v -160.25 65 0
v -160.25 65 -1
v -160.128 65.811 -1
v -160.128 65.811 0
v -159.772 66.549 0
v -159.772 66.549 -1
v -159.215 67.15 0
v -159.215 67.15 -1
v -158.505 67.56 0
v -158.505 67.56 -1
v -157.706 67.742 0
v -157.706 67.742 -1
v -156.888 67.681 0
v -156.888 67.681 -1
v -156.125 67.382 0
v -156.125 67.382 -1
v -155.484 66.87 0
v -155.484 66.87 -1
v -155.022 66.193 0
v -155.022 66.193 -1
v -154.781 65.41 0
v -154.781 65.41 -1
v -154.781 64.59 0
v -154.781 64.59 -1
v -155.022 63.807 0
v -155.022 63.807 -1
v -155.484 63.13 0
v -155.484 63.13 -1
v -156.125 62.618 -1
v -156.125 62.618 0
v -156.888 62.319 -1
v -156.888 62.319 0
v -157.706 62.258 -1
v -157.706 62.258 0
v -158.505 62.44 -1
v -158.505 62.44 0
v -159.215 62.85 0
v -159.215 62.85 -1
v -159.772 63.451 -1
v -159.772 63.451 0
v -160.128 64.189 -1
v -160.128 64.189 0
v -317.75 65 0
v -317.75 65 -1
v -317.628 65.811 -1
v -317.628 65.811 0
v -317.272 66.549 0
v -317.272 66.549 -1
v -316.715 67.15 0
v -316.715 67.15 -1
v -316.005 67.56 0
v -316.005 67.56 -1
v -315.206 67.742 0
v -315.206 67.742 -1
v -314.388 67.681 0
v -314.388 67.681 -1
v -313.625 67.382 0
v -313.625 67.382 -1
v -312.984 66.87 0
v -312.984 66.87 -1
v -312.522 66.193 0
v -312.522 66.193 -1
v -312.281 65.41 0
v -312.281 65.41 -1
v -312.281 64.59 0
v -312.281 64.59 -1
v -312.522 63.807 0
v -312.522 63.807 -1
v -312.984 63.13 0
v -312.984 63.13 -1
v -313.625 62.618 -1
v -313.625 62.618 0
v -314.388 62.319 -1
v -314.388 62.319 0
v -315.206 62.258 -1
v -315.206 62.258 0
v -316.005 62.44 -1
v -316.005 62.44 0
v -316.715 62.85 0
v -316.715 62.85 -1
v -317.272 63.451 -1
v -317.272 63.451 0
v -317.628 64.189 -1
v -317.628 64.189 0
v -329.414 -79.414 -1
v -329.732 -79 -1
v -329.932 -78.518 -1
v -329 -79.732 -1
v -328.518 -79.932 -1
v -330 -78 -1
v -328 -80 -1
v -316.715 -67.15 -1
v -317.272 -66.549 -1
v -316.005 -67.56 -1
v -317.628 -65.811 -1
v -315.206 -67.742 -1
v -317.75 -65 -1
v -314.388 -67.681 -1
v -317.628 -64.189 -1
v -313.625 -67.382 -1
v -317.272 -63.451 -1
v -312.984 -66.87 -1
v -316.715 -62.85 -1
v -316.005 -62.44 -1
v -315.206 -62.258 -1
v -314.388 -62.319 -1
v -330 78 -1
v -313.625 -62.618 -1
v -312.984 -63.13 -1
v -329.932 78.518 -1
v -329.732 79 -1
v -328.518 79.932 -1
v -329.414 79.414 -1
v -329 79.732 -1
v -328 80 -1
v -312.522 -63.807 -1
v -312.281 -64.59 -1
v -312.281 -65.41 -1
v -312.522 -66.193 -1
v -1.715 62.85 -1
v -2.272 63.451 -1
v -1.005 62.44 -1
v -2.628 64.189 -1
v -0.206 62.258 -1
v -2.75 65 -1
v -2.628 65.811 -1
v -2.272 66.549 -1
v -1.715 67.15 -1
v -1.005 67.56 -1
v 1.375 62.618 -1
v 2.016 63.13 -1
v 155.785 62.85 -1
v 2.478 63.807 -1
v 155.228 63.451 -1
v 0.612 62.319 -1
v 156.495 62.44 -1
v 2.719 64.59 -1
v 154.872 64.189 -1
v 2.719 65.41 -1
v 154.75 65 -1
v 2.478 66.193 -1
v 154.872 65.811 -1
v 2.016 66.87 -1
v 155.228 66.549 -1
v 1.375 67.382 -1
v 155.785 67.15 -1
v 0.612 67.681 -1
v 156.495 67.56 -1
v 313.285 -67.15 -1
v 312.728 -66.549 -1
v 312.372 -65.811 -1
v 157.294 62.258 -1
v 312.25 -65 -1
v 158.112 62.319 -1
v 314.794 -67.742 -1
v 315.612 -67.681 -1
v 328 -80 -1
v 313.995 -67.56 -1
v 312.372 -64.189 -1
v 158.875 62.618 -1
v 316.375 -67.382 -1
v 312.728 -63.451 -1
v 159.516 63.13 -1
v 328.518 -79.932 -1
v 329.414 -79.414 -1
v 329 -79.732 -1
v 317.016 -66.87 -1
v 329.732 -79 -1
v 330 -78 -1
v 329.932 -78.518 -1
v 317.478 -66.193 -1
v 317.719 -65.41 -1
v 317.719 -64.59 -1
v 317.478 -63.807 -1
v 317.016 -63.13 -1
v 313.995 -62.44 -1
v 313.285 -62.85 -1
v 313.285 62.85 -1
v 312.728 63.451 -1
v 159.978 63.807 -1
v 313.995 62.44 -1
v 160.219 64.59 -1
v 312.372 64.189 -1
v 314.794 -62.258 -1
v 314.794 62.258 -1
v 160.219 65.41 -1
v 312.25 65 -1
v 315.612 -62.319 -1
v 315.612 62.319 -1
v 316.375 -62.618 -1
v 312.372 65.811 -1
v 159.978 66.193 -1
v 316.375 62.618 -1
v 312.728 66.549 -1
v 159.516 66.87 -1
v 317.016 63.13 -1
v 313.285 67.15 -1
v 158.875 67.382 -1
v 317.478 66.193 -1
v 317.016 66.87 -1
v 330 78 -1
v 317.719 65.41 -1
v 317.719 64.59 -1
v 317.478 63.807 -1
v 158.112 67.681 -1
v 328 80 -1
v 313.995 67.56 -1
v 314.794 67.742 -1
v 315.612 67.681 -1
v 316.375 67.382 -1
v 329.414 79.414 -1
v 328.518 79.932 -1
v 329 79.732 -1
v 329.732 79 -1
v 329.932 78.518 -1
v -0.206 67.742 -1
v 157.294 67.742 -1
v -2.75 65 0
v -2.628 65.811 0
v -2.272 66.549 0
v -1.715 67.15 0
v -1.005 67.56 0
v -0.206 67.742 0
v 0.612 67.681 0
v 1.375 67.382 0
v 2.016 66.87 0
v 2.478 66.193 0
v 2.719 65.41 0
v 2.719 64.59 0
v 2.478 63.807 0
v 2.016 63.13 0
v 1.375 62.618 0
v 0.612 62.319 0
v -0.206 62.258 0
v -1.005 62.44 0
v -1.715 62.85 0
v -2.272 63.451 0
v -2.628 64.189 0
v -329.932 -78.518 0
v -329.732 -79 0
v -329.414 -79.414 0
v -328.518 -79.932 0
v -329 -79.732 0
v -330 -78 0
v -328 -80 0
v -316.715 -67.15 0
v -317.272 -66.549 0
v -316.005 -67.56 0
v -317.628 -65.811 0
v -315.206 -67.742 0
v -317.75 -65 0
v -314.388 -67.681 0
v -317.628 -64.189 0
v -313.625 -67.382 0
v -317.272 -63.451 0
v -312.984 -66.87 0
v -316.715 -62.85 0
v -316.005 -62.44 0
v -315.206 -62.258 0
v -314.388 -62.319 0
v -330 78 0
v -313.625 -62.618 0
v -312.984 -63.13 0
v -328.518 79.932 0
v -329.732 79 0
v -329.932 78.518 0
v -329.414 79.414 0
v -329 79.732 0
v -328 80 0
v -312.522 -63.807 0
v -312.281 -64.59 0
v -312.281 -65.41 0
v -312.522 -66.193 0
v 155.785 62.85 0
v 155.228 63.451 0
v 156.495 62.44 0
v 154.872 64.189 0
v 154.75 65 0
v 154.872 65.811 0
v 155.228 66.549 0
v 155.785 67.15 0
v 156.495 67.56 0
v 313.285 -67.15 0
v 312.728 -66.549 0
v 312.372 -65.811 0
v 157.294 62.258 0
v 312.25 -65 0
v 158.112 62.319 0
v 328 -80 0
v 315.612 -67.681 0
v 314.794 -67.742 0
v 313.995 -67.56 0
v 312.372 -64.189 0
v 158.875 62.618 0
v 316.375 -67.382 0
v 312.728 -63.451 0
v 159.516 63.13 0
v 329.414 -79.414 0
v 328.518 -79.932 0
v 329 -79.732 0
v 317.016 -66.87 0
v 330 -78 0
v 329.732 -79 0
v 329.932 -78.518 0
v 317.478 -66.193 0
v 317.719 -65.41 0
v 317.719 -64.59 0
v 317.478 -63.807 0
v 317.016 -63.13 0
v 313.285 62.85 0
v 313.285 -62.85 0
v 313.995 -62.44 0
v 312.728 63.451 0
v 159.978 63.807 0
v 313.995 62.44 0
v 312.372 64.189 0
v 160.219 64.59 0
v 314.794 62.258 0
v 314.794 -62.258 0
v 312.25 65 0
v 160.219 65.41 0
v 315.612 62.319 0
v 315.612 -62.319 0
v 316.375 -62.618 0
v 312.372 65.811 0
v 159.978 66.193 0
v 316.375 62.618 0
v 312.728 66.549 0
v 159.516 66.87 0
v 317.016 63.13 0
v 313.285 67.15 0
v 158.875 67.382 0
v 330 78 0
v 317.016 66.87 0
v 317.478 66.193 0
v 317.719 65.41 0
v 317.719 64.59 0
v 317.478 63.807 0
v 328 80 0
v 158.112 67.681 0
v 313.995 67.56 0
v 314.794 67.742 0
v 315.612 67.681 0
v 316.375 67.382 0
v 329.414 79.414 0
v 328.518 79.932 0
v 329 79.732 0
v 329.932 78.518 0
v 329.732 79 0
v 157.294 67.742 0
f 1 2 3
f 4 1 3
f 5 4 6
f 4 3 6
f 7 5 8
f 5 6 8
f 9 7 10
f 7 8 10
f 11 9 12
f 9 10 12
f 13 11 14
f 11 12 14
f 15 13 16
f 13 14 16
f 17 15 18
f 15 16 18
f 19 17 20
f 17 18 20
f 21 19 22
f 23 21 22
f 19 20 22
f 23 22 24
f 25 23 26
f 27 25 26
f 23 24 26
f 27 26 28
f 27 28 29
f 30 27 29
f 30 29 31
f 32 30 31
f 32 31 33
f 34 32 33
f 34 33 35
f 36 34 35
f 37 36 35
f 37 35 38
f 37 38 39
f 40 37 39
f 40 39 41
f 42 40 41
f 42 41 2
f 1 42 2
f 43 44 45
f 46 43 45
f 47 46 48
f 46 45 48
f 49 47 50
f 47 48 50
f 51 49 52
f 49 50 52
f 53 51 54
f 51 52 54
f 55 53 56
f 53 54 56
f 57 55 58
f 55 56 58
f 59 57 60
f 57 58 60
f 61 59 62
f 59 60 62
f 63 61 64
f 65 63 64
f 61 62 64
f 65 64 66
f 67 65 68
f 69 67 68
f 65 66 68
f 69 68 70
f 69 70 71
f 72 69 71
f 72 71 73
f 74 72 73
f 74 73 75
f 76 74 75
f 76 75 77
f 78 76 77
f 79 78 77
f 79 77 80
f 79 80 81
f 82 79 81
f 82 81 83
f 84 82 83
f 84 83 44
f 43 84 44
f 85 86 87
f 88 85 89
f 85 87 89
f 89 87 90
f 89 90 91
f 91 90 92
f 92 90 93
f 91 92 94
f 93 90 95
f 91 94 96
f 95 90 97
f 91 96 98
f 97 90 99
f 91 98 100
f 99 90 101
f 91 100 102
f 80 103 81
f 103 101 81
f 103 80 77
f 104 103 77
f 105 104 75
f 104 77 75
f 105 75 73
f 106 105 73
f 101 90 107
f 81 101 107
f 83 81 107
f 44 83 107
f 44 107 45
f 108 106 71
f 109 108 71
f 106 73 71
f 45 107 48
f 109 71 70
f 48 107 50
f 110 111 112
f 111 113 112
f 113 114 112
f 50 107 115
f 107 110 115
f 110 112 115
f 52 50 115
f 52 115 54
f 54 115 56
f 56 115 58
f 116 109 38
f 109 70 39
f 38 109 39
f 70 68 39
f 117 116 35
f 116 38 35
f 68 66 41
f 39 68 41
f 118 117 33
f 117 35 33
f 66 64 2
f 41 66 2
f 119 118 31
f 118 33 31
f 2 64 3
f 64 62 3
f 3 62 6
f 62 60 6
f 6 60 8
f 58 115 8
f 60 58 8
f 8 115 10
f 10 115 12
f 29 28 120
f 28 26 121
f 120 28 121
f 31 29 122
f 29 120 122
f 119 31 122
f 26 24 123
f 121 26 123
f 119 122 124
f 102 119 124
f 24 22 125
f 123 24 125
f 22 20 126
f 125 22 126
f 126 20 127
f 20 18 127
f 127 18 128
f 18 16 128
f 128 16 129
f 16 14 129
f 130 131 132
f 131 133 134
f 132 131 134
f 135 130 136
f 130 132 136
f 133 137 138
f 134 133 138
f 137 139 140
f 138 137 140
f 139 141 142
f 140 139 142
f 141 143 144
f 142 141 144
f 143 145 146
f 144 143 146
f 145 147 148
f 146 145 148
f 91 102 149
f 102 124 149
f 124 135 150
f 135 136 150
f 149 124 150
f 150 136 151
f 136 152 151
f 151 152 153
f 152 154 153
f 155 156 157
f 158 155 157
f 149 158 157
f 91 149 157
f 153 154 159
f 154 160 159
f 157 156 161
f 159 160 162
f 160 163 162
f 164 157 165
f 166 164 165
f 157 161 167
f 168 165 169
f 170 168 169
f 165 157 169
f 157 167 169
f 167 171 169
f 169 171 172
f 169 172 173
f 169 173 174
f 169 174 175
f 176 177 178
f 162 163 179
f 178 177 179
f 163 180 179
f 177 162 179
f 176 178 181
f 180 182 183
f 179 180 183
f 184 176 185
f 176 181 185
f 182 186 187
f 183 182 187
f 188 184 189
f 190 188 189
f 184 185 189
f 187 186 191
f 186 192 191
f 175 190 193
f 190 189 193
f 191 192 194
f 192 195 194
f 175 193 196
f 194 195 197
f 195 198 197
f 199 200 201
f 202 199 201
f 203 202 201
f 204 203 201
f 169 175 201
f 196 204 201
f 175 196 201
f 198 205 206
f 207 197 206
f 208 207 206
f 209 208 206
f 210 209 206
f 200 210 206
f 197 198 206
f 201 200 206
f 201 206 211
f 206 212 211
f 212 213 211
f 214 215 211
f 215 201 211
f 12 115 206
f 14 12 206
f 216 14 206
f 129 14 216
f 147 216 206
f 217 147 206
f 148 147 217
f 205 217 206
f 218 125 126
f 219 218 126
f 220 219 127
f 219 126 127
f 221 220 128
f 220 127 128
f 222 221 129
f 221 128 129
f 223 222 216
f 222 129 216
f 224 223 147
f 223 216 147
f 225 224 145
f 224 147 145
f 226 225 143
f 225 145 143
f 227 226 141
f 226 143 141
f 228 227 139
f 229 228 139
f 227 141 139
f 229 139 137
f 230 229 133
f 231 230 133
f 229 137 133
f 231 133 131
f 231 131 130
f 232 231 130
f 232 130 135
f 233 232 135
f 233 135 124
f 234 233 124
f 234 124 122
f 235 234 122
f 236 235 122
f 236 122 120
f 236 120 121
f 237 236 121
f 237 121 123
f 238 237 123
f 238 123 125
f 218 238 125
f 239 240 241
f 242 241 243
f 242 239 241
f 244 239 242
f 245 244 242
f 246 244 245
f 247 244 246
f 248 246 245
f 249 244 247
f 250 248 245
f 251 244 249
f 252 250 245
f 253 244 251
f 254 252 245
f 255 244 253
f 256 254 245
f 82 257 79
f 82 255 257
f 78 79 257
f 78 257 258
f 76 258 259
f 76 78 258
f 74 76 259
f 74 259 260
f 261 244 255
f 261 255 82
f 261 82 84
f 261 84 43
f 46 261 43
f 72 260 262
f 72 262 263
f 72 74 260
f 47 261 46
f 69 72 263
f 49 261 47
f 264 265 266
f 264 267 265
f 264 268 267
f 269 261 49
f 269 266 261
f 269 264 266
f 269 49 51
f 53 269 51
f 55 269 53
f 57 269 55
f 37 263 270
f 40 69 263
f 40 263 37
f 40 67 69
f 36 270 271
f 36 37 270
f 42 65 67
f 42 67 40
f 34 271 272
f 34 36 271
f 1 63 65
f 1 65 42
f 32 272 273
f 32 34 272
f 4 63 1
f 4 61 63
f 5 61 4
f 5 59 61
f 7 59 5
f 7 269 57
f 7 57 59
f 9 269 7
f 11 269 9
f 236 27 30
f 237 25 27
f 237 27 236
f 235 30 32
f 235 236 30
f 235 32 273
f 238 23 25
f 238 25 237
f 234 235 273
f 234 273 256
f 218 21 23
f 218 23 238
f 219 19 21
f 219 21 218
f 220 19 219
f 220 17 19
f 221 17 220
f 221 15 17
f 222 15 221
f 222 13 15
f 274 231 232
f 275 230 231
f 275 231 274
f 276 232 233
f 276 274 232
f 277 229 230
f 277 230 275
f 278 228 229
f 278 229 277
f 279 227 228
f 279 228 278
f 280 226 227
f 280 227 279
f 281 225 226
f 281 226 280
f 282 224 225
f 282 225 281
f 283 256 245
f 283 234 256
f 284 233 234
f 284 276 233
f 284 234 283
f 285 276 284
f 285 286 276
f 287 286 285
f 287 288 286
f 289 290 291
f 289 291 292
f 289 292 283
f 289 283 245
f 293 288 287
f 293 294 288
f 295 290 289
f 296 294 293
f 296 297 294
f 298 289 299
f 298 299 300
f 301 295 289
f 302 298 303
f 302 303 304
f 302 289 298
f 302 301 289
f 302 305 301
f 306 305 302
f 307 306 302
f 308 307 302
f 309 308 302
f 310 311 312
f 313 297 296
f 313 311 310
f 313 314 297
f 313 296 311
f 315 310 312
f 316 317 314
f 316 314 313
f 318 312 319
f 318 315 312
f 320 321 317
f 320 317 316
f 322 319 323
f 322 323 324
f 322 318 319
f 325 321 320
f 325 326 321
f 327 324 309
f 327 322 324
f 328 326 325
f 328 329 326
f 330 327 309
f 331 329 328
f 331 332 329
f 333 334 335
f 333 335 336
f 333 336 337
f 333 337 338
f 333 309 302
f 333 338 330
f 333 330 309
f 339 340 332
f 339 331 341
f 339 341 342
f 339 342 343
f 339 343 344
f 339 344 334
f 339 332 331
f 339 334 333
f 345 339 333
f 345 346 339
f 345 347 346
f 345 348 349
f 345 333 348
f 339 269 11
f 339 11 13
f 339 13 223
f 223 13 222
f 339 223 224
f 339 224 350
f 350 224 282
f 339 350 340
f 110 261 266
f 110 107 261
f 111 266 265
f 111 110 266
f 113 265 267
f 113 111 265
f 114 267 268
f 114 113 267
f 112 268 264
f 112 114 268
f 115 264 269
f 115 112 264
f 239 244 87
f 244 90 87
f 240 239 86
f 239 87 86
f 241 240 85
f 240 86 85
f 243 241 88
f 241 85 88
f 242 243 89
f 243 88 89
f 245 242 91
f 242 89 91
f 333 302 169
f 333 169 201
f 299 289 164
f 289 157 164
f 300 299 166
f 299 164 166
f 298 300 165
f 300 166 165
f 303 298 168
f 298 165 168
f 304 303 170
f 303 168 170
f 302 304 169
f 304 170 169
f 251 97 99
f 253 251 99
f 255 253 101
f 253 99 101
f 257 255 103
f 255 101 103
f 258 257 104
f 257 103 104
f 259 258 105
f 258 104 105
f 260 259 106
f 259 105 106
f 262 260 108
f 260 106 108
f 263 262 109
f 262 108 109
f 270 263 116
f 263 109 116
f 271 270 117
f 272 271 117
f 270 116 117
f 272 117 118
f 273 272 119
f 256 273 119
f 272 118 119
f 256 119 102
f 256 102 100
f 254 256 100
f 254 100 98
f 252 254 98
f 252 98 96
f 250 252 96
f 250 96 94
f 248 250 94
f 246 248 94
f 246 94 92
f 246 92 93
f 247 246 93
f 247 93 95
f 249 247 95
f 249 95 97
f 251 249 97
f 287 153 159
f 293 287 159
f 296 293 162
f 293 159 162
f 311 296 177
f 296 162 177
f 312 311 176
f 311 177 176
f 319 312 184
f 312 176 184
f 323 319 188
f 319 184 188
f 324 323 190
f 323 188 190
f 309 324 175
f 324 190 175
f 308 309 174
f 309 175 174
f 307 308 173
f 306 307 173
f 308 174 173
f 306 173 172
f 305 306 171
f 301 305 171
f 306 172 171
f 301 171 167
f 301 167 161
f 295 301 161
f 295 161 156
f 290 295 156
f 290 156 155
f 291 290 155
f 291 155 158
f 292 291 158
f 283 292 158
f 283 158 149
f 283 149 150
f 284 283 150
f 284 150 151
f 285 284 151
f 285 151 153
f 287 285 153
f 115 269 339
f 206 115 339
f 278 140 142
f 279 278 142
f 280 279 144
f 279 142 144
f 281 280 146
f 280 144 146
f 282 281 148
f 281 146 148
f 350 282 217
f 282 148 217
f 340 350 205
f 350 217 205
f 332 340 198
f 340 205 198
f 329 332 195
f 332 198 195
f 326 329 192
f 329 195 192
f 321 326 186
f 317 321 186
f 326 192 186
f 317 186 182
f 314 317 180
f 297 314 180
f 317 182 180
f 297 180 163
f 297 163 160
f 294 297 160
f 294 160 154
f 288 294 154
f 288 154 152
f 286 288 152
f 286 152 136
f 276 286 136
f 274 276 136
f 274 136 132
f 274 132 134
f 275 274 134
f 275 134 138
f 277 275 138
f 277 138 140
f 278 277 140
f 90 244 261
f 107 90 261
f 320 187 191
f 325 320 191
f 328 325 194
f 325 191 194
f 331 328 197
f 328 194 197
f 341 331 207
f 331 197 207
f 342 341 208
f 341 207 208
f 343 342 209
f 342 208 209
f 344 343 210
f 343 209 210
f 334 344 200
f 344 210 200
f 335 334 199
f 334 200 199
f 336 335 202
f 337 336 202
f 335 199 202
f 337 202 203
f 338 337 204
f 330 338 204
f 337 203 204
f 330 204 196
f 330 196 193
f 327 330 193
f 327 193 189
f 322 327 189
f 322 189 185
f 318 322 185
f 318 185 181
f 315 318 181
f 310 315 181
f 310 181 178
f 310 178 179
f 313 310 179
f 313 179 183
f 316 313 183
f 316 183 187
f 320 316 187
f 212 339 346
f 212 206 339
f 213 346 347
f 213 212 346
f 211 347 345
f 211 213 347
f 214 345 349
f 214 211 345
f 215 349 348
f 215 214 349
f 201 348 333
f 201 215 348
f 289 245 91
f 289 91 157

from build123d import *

# Parameters (mm, degrees)
SKETCH1_W            = 660
SKETCH1_H            = 160
BASE_FLANGE1_DEPTH   = 1
M5_CLEARANCE_HOLE2_D = 5.5
FILLET1_R            = 2


# Sheet-metal steps are written as plain solids
with BuildPart() as part:
    # Sketch1 → Base-Flange1 (new body)
    with BuildSketch(Plane.XY):
        Rectangle(SKETCH1_W, SKETCH1_H)
    extrude(amount=-BASE_FLANGE1_DEPTH)

    # M5 Clearance Hole2 (through all)
    with Locations(Plane.XY):
        with Locations((0, 65), (-315, 65), (-315, -65), (315, -65), (315, 65), (-157.5, 65), (157.5, 65)):
            Hole(M5_CLEARANCE_HOLE2_D / 2)

    # Fillet1
    fillet1_edges = [part.edges().sort_by_distance(p)[0] for p in [
        (-330, 80, -0.5),
        (330, 80, -0.5),
        (330, -80, -0.5),
        (-330, -80, -0.5),
    ]]
    fillet(fillet1_edges, radius=FILLET1_R)


solid = part.part
